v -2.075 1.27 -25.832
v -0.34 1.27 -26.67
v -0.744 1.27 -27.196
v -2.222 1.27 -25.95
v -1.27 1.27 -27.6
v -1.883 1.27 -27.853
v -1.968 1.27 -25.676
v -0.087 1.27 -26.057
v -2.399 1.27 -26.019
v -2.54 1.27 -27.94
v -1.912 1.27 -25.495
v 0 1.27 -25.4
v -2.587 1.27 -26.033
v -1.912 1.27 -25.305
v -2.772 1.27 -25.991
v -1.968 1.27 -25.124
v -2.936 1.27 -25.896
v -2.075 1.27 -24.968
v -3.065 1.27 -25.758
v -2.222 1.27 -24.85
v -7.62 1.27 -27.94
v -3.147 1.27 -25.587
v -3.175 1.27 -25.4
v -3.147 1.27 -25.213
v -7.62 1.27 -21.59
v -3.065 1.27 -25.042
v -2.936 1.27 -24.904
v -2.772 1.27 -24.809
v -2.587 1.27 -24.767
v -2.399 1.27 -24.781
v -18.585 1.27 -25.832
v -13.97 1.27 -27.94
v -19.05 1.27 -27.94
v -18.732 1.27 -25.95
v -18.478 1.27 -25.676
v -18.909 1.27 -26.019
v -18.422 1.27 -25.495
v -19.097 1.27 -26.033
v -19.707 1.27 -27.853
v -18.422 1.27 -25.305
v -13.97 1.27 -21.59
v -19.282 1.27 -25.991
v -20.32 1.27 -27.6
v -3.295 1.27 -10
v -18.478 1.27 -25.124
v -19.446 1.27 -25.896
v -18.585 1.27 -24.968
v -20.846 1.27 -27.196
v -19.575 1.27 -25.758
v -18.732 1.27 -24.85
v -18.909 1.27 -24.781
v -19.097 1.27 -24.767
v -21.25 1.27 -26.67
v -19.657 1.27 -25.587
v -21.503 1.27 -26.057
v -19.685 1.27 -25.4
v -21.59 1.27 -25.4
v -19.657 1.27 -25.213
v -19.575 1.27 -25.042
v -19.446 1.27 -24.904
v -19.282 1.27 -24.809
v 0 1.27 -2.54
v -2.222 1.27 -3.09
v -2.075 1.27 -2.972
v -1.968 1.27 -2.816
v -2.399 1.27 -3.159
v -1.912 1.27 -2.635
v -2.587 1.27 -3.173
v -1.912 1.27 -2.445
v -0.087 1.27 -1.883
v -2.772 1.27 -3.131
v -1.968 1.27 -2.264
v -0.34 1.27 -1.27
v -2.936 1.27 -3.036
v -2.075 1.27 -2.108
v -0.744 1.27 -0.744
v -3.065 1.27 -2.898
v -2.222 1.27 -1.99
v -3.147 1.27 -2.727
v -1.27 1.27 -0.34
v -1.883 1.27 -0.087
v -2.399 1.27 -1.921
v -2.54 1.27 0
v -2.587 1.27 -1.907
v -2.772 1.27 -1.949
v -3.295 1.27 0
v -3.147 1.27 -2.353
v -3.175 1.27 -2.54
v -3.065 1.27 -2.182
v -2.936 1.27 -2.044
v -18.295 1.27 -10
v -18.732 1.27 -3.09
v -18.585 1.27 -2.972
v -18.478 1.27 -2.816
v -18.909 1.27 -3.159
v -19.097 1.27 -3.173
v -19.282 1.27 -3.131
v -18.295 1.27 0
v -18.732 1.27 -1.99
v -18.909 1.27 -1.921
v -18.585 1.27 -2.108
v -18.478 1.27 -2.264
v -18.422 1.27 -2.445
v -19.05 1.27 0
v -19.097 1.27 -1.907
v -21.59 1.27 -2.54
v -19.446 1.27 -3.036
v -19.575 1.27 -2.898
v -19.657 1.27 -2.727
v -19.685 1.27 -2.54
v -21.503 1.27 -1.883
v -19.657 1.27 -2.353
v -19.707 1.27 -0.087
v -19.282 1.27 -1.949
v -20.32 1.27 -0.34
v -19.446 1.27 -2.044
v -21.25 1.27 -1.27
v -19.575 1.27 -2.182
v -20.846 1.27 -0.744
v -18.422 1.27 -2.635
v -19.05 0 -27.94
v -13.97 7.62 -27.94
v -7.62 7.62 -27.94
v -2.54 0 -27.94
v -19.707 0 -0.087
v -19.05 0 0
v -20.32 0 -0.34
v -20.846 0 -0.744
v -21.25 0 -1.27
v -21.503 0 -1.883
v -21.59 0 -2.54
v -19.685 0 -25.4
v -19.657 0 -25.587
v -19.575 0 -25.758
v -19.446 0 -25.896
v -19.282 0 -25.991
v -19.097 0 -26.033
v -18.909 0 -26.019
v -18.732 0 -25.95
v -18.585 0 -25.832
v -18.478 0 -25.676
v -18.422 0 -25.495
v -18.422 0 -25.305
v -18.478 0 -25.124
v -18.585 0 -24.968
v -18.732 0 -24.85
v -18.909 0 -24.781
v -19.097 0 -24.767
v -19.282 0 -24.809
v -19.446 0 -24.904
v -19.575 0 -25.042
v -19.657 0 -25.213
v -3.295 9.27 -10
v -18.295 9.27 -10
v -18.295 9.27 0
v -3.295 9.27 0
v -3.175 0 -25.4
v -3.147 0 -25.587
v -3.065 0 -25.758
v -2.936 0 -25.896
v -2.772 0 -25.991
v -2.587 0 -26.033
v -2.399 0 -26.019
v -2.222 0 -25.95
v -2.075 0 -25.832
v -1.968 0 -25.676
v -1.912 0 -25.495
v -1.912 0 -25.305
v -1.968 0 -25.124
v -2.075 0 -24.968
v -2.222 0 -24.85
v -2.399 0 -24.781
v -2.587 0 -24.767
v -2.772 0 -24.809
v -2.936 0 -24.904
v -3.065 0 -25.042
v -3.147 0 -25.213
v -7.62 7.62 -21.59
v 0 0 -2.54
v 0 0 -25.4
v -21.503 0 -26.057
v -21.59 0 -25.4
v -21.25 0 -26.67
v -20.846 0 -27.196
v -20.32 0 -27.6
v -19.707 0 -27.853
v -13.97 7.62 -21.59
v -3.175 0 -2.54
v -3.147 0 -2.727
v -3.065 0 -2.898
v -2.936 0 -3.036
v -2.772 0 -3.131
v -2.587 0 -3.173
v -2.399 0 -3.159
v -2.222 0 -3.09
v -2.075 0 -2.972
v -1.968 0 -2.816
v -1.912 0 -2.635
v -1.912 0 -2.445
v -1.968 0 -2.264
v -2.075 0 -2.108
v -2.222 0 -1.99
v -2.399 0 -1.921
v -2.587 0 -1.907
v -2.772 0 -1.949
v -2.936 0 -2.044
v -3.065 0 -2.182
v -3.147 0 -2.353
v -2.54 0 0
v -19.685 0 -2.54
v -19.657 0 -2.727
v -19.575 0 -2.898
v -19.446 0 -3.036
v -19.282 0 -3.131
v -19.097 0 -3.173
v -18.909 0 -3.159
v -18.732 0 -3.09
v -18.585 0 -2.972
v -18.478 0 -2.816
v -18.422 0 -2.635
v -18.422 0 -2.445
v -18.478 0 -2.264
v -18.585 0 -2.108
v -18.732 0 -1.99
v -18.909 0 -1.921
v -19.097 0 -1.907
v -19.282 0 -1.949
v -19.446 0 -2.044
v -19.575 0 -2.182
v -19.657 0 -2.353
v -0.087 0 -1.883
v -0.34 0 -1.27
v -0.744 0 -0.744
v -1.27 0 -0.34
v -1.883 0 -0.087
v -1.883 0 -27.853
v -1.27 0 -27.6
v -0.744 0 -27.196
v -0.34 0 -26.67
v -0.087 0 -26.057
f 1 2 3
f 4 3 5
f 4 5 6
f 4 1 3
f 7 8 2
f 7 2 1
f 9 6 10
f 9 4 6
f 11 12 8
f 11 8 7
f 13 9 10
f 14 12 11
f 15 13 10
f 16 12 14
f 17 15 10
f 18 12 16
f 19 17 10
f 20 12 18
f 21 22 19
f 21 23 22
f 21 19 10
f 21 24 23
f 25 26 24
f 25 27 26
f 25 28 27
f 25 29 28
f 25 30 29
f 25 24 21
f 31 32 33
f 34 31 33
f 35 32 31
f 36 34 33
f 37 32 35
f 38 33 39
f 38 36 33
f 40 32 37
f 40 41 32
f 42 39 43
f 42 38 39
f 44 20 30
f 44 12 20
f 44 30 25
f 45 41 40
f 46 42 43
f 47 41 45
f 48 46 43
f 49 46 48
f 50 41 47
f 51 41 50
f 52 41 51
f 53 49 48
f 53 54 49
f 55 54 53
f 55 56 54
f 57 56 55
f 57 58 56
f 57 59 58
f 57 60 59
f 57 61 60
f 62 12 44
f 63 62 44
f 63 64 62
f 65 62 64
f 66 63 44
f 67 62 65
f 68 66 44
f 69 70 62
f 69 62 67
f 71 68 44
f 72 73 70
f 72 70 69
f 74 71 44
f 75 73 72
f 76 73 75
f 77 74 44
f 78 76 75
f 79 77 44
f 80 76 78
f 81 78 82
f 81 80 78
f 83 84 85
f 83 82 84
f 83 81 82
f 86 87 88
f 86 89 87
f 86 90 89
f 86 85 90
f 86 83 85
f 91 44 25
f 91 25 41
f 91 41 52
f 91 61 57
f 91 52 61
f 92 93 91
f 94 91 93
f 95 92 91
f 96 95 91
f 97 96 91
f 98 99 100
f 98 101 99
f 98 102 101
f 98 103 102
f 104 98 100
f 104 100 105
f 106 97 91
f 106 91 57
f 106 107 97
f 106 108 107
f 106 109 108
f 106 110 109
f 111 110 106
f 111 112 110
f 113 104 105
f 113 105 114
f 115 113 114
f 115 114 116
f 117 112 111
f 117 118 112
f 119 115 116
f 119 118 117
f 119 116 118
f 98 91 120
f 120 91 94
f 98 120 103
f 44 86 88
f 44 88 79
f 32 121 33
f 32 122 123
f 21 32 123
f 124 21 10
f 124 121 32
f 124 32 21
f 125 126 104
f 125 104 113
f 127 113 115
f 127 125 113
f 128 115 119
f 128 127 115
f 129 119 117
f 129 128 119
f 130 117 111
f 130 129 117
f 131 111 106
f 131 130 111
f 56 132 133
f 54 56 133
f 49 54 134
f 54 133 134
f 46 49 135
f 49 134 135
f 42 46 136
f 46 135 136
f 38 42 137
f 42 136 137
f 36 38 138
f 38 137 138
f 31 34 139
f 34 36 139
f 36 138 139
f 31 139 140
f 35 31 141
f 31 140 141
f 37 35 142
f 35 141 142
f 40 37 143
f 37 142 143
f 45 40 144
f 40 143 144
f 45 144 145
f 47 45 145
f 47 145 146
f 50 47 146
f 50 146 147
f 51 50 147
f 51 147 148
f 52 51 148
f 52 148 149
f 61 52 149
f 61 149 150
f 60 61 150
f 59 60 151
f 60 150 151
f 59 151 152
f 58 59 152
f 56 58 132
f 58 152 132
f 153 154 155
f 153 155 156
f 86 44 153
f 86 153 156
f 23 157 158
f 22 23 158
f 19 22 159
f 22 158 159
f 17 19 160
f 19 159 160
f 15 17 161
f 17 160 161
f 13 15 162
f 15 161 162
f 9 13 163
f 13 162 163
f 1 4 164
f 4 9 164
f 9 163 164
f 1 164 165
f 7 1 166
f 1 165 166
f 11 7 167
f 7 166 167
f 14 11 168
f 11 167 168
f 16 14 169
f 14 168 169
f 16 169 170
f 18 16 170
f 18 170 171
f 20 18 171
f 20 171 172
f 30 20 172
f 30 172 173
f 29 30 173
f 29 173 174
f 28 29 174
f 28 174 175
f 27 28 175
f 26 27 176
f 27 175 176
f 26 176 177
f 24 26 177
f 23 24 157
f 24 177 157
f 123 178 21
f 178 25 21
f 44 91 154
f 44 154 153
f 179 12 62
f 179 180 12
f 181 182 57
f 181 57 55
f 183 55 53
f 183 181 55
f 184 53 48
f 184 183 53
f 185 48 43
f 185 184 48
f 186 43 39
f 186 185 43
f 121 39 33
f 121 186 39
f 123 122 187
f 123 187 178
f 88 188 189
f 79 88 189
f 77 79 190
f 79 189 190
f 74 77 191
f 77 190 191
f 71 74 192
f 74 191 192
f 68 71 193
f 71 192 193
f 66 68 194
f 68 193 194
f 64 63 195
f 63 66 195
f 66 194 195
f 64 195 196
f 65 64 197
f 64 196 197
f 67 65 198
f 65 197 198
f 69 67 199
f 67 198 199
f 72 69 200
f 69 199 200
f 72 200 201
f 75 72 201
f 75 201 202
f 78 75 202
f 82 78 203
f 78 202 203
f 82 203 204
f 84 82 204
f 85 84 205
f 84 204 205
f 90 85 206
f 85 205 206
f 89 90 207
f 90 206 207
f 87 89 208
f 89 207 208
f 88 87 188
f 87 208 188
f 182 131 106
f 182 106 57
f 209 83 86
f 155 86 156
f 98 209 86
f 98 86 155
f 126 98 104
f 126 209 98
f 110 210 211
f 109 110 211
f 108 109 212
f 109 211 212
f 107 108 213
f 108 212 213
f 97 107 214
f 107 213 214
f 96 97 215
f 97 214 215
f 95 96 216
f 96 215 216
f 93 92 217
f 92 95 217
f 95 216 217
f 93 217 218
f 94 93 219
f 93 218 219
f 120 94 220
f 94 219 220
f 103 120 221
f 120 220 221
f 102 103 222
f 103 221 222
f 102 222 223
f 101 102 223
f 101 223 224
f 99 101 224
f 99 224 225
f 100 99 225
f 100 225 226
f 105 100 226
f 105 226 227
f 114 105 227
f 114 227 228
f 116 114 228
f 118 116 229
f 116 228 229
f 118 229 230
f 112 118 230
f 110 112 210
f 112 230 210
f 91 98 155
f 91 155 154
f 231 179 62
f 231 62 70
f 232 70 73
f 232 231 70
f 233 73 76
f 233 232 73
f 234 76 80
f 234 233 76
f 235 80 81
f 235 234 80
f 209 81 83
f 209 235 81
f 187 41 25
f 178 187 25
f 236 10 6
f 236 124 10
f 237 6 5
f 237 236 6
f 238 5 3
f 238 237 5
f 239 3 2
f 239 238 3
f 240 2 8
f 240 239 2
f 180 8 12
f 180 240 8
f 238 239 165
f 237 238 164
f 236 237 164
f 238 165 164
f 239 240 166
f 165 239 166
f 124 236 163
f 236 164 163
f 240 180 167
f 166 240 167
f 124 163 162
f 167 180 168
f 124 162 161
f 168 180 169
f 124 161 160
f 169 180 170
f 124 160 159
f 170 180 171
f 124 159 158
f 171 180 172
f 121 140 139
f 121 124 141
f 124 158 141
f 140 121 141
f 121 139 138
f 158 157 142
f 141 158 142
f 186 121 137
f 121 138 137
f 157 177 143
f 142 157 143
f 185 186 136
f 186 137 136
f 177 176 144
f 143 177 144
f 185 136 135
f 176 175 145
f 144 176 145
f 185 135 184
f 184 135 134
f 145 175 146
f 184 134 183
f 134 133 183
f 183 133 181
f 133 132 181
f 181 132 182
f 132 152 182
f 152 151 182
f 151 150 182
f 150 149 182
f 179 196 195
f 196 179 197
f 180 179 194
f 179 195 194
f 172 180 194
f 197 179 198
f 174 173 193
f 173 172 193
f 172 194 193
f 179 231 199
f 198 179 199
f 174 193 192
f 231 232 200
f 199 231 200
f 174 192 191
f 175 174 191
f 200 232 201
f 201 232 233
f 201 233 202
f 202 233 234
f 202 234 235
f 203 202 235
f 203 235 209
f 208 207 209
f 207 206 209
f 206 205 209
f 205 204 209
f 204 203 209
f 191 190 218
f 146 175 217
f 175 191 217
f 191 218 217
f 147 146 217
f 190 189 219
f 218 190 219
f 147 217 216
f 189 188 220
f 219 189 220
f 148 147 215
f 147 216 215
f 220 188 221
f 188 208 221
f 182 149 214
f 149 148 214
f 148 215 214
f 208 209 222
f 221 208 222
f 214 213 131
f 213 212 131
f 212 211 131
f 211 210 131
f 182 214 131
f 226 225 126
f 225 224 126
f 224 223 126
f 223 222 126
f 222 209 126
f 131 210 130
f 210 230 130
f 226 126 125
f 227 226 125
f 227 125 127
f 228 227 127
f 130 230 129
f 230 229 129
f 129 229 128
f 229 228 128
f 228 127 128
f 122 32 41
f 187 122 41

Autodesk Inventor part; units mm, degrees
ref_plane "YZ Plane" through (0, 0, 0) normal (1, 0, 0) x (0, 1, 0)
ref_plane "XZ Plane" through (0, 0, 0) normal (0, 1, 0) x (-1, 0, 0)
ref_plane "XY Plane" through (0, 0, 0) normal (0, 0, 1) x (1, 0, 0)
sketch "Sketch1" plane through (0, 0, 0) normal (0, 1, 0) x (-1, 0, 0)
  line L0 (2.54, 0) -> (19.05, 0)
  line L1 (21.59, -2.54) -> (21.59, -25.4)
  line L2 (19.05, -27.94) -> (2.54, -27.94)
  line L3 (0, -25.4) -> (0, -2.54)
  arc A0 (21.59, -2.54) -> (19.05, 0) centre (19.05, -2.54) ccw
  arc A1 (2.54, 0) -> (0, -2.54) centre (2.54, -2.54) ccw
  arc A2 (0, -25.4) -> (2.54, -27.94) centre (2.54, -25.4) ccw
  arc A3 (19.05, -27.94) -> (21.59, -25.4) centre (19.05, -25.4) ccw
  circle A4 centre (19.05, -2.54) radius 0.635
  circle A5 centre (2.54, -2.54) radius 0.635
  circle A6 centre (2.54, -25.4) radius 0.635
  circle A7 centre (19.05, -25.4) radius 0.635
  point P0 (0, 0)
  point P1 (21.59, -27.94)
  point P2 (21.59, 0)
  point P3 (0, -27.94)
  dimension "d0" = 21.59
  dimension "d1" = 27.94
  dimension "d2" = 2.54
  dimension "d3" = 1.27
  dimension "d4" = 1.27
  dimension "d5" = 1.27
  dimension "d6" = 1.27
extrude "Extrusion1" add sketch "Sketch1" along normal blind 1.27
sketch "Sketch2" plane through (0, 1.27, 0) normal (0, 1, 0) x (1, 0, 0)
  line L0 (-19.05, 0) -> (-2.54, 0) construction
  line L1 (-10.795, 0) -> (-10.795, 27.94) construction
  line L2 (-2.54, 27.94) -> (-19.05, 27.94) construction
  line L3 (-13.97, 27.94) -> (-7.62, 27.94) construction
  line L4 (-7.62, 27.94) -> (-7.62, 21.59) construction
  line L5 (-7.62, 21.59) -> (-13.97, 21.59) construction
  line L6 (-13.97, 21.59) -> (-13.97, 27.94) construction
  line L7 (-13.97, 21.59) -> (-7.62, 21.59) construction
  line L8 (-7.62, 21.59) -> (-7.62, 27.94) construction
  line L9 (-7.62, 27.94) -> (-13.97, 27.94) construction
  line L10 (-13.97, 27.94) -> (-13.97, 21.59) construction
  line L11 (-13.97, 21.59) -> (-7.62, 21.59)
  line L12 (-7.62, 21.59) -> (-7.62, 27.94)
  line L13 (-7.62, 27.94) -> (-13.97, 27.94)
  line L14 (-13.97, 27.94) -> (-13.97, 21.59)
  point P0 (0, 0)
  dimension "d9" = 6.35
  dimension "d10" = 6.35
  dimension "d11" = 3.175
extrude "Extrusion2" add sketch "Sketch2" along normal blind 6.35
sketch "Sketch3" plane through (0, 1.27, 0) normal (0, 1, 0) x (1, 0, 0)
  line L0 (-18.295, 10) -> (-3.295, 10)
  line L1 (-3.295, 10) -> (-3.295, 0)
  line L2 (-3.295, 0) -> (-18.295, 0)
  line L3 (-18.295, 0) -> (-18.295, 10)
  line L4 (-7.62, 27.94) -> (-13.97, 27.94) construction
  line L5 (-10.795, 27.94) -> (-10.795, 0) construction
  line L6 (-2.54, 0) -> (-19.05, 0) construction
  line L7 (-10.795, 10) -> (-10.795, 0) construction
  line L8 (-19.05, 0) -> (-2.54, 0) construction
  point P0 (0, 0)
  dimension "d14" = 15
  dimension "d15" = 10
extrude "Extrusion3" add sketch "Sketch3" along normal blind 8
equation "\"d4\" = d3"
equation "\"d5\" = d3"
equation "\"d6\" = d3"
equation "\"d11\" = 0.5 * d10"
properties part number "Adafruit-PowerBoost500"
